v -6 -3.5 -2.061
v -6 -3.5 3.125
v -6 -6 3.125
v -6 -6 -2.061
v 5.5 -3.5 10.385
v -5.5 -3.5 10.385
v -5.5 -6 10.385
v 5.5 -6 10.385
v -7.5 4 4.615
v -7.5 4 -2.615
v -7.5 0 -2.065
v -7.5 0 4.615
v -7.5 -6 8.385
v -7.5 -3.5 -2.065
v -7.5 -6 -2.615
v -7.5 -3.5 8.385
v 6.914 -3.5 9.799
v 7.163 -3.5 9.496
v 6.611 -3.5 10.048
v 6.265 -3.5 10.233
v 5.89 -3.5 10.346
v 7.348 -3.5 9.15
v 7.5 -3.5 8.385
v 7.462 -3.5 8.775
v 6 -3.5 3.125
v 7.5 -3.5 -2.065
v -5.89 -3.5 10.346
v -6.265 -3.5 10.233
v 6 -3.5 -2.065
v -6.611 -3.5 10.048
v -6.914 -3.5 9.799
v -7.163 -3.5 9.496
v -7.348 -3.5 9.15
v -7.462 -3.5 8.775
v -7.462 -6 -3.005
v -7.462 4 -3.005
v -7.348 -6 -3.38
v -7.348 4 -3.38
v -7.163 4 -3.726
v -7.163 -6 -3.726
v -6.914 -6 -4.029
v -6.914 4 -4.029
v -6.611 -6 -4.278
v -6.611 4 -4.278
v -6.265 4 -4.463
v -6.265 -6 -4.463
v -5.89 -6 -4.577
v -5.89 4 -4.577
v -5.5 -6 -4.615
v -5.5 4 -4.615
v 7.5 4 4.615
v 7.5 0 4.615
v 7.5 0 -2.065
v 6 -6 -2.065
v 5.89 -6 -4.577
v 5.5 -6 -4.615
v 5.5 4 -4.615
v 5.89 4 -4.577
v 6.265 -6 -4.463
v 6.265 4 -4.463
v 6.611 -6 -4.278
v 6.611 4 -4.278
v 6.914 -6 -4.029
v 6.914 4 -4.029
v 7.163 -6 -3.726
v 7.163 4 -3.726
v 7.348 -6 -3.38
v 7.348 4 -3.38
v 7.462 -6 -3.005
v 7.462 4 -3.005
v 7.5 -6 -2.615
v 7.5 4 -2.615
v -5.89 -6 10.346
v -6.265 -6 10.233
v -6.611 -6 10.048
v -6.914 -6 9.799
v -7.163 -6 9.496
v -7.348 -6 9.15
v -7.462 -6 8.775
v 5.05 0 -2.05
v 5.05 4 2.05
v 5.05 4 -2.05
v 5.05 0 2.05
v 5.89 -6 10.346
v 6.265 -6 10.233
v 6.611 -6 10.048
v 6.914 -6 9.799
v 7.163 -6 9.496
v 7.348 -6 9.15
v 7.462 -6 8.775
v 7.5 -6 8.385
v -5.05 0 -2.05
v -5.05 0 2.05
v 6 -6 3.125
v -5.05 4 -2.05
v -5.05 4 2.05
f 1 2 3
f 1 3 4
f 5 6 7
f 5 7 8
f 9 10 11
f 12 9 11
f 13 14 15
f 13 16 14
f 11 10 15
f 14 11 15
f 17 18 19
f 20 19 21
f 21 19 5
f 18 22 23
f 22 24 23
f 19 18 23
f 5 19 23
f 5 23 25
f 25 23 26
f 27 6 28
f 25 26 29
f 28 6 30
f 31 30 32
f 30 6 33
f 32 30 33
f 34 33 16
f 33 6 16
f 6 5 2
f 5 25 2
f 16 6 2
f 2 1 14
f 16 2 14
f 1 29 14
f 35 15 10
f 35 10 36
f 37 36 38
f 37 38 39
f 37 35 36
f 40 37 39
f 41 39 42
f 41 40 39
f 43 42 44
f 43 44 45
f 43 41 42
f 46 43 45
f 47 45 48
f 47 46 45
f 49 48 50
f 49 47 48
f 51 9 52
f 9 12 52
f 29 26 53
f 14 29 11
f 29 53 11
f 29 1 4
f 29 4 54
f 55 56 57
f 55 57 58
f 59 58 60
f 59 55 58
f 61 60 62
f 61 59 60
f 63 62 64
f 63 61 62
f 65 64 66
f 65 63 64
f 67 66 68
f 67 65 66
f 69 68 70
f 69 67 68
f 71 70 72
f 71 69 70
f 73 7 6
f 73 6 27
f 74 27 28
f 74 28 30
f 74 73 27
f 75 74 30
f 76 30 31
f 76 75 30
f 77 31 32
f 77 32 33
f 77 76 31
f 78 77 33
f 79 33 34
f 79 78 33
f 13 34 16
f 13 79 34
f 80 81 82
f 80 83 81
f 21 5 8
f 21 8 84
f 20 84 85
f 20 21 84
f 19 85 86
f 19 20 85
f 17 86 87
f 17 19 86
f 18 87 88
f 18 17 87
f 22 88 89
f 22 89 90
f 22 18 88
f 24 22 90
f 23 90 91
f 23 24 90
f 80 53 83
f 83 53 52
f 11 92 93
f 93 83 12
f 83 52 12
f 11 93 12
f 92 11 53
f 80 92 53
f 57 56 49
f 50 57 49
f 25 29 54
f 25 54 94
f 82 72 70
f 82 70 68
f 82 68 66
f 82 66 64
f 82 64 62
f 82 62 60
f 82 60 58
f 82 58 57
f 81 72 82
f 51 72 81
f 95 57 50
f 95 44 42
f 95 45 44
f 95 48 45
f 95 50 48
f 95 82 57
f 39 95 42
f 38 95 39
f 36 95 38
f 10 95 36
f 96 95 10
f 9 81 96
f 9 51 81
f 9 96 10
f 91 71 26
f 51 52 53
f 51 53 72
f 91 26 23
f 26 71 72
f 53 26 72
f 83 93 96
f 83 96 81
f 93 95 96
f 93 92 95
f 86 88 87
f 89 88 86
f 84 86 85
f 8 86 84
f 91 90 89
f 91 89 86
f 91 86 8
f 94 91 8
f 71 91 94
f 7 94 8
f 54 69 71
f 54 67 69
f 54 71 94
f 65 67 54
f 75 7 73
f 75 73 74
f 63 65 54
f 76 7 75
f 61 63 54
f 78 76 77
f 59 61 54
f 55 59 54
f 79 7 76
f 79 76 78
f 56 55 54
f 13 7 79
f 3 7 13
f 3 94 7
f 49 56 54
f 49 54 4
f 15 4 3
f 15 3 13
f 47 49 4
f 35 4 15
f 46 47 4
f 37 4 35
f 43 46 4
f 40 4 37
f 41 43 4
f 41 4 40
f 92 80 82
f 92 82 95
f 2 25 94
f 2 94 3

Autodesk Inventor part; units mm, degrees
ref_plane "YZ Plane" through (0, 0, 0) normal (1, 0, 0) x (0, 1, 0)
ref_plane "XZ Plane" through (0, 0, 0) normal (0, 1, 0) x (-1, 0, 0)
ref_plane "XY Plane" through (0, 0, 0) normal (0, 0, 1) x (1, 0, 0)
sketch "スケッチ1" plane through (0, 0, 0) normal (0, 1, 0) x (-1, 0, 0)
  line L0 (5.05, 2.05) -> (-5.05, 2.05)
  line L1 (-5.05, 2.05) -> (-5.05, -2.05)
  line L2 (-5.05, -2.05) -> (5.05, -2.05)
  line L3 (5.05, -2.05) -> (5.05, 2.05)
  line L4 (5.05, 2.05) -> (-5.05, -2.05) construction
  line L5 (-5.05, 2.05) -> (5.05, -2.05) construction
  line L6 (7.5, 4.6151) -> (-7.5, 4.6151)
  line L7 (-7.5, 4.6151) -> (-7.5, -4.6151)
  line L8 (-7.5, -4.6151) -> (7.5, -4.6151)
  line L9 (7.5, -4.6151) -> (7.5, 4.6151)
  line L10 (7.5, 4.6151) -> (-7.5, -4.6151) construction
  line L11 (-7.5, 4.6151) -> (7.5, -4.6151) construction
  point P0 (0, 0)
  dimension "d0" = 10.1
  dimension "d1" = 4.1
  dimension "d2" = 15
extrude "押し出し1" add sketch "スケッチ1" along normal blind 4
sketch "スケッチ2" plane through (0, 0, 0) normal (0, -1, 0) x (1, 0, 0)
  line L0 (7.5, 4.6151) -> (7.5, -4.6151) projected
  line L1 (-7.5, -4.6151) -> (7.5, -4.6151)
  line L2 (7.5, -4.6151) -> (7.5, -2.0651)
  line L3 (7.5, -2.0651) -> (-7.5, -2.0651)
  line L4 (-7.5, -2.0651) -> (-7.5, -4.6151)
  point P0 (0, 0)
  dimension "d5" = 2.55
extrude "押し出し2" add sketch "スケッチ2" along normal blind 6
sketch "スケッチ3" plane through (-7.5, 0, -2.0651) normal (0, 0, 1) x (1, 0, 0)
  line L0 (15, -6) -> (0, -6) projected
  line L1 (15, -6) -> (15, 4) projected
  line L2 (0, -6) -> (15, -6)
  line L3 (15, -6) -> (15, -3.5)
  line L4 (15, -3.5) -> (0, -3.5)
  line L5 (0, -3.5) -> (0, -6)
  point P0 (7.5, 0)
  dimension "d8" = 2.5
extrude "押し出し3" add sketch "スケッチ3" along normal blind 12.45
sketch "スケッチ4" plane through (-7.5, -3.5, -2.0651) normal (0, 1, 0) x (1, 0, 0)
  line L0 (1.5, 1.0597) -> (13.5, 1.0597)
  line L1 (13.5, 1.0597) -> (13.5, -5.1899)
  line L2 (13.5, -5.1899) -> (1.5, -5.1899)
  line L3 (1.5, -5.1899) -> (1.5, 1.0597)
  line L4 (1.5, 1.0597) -> (13.5, -5.1899) construction
  line L5 (13.5, 1.0597) -> (1.5, -5.1899) construction
  line L6 (1.5, -0.0039) -> (13.5, 0)
  line L7 (0, 0) -> (15, 0) projected
  point P0 (7.5, -2.0651)
  dimension "d11" = 12
extrude "押し出し4" cut sketch "スケッチ4" against normal blind 10 contours L1 L2 L3 L6
fillet "フィレット1" radius 2 4 edges at (7.5, -4.75, 10.3849) (-7.5, -4.75, 10.3849) (-7.5, -1, -4.6151) (7.5, -1, -4.6151)
properties part number "LRA_case2"
